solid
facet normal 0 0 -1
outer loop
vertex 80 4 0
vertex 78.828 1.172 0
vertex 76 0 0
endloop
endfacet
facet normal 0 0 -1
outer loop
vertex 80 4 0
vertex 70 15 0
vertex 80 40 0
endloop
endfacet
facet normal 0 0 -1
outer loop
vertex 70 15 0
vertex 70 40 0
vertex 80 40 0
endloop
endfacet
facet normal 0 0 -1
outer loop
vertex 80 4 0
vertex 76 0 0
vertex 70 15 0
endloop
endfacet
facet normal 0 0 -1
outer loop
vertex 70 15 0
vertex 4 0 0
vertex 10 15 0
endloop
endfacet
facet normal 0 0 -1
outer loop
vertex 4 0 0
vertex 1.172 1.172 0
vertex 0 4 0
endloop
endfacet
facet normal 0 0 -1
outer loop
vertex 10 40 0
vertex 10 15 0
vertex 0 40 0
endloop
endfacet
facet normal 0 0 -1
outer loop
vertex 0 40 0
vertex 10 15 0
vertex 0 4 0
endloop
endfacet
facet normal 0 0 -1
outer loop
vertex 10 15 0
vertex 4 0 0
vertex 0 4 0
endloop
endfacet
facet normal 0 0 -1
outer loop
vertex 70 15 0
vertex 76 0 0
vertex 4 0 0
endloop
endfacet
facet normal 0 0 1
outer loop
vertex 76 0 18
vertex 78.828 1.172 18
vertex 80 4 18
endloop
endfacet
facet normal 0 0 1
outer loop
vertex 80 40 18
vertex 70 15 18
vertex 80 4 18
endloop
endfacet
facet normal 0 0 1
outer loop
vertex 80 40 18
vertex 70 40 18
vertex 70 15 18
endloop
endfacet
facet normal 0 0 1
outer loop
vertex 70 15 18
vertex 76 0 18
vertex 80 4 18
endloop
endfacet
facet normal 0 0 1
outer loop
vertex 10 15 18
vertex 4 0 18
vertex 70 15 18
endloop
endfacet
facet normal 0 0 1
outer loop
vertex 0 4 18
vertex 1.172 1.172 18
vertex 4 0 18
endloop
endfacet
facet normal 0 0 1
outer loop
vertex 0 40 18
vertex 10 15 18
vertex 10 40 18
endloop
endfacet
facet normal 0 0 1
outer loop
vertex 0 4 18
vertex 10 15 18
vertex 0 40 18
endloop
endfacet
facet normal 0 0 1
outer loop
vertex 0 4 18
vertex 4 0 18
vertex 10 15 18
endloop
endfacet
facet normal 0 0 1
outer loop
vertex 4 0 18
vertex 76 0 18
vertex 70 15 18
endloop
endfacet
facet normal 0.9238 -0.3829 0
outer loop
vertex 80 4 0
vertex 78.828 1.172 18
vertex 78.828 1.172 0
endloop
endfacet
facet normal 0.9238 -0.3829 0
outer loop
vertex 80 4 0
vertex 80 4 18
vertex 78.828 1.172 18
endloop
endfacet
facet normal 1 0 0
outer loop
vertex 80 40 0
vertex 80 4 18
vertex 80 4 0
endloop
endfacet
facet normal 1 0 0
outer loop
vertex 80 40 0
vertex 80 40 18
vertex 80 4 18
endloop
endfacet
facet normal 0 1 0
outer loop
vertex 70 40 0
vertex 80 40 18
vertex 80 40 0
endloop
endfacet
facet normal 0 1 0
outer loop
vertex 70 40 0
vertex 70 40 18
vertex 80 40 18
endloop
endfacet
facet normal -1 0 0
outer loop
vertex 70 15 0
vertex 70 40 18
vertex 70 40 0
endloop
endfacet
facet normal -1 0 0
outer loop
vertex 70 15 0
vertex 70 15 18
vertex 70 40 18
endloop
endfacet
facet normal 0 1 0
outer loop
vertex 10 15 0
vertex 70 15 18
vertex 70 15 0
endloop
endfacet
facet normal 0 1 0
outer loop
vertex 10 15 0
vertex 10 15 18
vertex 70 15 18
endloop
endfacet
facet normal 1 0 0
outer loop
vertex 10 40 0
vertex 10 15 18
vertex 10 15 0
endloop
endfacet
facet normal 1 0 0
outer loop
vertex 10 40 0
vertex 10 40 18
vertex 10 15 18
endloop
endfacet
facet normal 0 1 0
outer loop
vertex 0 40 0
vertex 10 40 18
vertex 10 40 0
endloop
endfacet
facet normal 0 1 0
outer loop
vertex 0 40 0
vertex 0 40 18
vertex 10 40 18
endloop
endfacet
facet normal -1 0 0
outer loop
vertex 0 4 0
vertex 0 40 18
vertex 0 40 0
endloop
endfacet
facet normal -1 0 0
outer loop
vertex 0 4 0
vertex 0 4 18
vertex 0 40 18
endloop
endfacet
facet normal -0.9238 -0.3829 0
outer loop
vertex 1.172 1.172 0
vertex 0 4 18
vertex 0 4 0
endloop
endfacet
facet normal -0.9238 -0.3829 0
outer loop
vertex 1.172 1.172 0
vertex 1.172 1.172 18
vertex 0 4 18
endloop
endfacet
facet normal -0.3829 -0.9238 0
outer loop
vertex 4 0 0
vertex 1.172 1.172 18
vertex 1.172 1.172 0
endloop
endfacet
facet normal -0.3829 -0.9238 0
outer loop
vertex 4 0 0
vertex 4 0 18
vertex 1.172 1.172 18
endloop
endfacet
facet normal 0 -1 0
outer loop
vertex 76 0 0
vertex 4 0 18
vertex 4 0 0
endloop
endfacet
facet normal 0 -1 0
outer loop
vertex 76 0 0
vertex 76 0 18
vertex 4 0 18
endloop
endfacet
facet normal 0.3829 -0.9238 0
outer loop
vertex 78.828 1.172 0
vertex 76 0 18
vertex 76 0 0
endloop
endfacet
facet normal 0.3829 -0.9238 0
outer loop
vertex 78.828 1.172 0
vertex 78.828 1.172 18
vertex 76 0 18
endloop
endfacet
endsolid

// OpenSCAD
$fn = 32;

// ----------------------------------------------------------------------
// Heat sink frame: 80 x 40 mm frame, 10 mm walls
// ----------------------------------------------------------------------

// --- parameters (mm) ---
profile_height = 18;      // extrusion height
profile_points = 12;      // points of the closed outline

profile = [[0, 4], [1.172, 1.172], [4, 0], [76, 0], [78.828, 1.172], [80, 4], [80, 40], [70, 40], [70, 15], [10, 15], [10, 40], [0, 40]];  // single closed polygon, 12 points, counter clockwise

// --- the one profile operation ---
linear_extrude(height = profile_height) polygon(points = profile);
